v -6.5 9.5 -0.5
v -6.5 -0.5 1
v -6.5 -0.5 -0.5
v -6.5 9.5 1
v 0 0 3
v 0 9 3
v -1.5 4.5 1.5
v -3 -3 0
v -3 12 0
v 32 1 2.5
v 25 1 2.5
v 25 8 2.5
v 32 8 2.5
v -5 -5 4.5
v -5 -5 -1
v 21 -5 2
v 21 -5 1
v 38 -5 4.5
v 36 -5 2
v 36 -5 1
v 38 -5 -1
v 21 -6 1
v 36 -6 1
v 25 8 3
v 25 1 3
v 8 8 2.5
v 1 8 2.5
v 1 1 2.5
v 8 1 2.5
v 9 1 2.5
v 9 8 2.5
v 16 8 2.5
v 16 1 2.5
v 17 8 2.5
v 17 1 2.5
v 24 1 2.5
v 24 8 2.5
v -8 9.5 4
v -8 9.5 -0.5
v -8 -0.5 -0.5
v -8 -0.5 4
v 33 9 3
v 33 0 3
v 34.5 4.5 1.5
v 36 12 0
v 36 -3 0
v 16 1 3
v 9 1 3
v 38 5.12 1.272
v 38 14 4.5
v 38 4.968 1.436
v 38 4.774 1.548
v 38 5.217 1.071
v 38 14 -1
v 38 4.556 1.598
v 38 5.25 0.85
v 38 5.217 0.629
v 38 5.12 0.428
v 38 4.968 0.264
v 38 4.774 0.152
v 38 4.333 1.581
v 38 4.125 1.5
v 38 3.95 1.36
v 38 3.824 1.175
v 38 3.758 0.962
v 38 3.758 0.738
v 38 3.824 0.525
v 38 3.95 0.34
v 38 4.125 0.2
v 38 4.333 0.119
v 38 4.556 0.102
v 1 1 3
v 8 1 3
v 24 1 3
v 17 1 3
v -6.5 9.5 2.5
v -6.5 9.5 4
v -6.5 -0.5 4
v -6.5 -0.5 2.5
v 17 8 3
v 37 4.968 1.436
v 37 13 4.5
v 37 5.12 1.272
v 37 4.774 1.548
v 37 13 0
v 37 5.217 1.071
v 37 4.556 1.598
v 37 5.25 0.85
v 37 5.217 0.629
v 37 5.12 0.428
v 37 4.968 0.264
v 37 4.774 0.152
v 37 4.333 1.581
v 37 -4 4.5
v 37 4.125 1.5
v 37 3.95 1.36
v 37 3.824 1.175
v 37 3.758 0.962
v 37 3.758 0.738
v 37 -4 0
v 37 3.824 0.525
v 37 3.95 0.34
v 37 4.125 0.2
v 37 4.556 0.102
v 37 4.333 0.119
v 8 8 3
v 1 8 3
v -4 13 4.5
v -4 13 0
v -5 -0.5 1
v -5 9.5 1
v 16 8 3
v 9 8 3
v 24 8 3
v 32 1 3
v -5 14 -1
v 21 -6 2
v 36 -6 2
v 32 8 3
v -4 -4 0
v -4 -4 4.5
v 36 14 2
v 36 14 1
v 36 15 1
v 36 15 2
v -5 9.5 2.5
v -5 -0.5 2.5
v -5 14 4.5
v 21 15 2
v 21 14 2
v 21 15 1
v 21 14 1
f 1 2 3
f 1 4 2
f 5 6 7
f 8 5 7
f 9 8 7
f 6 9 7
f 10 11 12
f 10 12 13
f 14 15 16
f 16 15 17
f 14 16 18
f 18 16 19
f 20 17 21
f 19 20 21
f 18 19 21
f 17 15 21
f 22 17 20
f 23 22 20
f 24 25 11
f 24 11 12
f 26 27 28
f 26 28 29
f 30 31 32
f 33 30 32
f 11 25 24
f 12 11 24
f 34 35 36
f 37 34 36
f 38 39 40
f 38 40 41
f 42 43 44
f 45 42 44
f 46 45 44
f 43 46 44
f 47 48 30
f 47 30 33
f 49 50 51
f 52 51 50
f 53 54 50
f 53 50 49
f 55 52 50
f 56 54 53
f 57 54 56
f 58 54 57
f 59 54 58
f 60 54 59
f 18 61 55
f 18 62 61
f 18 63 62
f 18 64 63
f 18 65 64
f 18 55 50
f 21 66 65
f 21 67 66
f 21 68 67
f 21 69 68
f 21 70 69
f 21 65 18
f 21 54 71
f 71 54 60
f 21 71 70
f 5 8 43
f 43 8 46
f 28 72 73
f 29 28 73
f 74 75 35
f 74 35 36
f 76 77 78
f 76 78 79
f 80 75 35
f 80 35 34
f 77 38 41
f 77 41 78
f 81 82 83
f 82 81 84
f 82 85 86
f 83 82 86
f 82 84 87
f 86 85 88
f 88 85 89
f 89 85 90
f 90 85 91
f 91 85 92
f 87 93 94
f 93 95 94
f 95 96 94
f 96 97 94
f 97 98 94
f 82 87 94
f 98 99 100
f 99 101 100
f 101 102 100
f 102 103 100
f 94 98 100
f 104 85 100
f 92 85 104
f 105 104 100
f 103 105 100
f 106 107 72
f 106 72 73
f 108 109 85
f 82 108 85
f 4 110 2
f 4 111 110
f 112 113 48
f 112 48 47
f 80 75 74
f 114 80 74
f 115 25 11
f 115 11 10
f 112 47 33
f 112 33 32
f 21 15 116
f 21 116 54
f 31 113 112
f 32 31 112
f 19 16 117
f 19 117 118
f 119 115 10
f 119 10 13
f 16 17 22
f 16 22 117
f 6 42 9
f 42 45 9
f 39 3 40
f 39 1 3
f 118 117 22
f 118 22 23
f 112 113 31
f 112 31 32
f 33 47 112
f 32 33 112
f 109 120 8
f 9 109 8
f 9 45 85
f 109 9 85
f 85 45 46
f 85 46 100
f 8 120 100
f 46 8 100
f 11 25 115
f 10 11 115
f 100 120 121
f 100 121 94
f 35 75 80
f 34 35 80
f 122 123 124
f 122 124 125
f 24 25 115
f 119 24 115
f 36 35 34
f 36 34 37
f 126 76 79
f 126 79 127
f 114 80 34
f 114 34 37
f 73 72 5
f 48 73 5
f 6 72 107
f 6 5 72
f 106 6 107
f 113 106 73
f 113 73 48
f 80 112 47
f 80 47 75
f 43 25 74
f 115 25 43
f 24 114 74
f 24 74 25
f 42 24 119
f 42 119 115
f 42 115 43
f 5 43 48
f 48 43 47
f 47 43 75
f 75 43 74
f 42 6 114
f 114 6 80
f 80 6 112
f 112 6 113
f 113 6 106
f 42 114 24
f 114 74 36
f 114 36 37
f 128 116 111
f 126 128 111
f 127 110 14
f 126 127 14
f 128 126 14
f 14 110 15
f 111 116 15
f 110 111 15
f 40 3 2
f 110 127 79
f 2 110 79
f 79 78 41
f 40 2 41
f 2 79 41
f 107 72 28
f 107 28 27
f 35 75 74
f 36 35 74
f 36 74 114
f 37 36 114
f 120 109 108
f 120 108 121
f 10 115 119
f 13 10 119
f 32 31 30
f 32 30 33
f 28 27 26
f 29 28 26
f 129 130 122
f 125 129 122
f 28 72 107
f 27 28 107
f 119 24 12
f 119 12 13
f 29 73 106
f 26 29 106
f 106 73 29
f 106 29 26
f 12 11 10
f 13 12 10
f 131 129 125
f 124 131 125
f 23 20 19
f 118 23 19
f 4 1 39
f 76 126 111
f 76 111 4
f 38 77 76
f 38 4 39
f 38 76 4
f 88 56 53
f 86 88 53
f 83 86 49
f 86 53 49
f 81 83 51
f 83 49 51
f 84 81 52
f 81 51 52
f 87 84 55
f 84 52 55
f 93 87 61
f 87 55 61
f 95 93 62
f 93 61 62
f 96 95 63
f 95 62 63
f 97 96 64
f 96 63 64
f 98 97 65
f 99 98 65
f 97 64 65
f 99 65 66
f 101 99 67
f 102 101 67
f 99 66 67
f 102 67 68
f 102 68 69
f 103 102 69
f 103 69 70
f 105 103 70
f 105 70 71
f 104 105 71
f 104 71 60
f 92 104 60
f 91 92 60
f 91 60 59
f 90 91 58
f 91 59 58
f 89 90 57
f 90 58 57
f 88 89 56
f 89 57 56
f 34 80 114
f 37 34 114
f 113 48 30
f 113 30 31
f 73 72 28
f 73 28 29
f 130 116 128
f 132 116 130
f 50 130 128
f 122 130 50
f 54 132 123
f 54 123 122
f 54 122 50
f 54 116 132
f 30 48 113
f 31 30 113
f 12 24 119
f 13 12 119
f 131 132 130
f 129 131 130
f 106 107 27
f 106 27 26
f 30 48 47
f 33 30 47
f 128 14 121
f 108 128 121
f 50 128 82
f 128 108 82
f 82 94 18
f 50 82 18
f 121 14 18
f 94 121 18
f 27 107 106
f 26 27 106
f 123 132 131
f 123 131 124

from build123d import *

# Parameters (mm, degrees)
F2_W      = 33
F2_H      = 9
F0_W      = 39
F0_H      = 15
F4_W      = 7
F4_H      = 7
F5_DEPTH  = 0.5
F6_DEPTH  = 0.5
F7_W      = 43
F7_H      = 19
F7_W_2    = 41
F7_H_2    = 17
F7_W_3    = 39
F7_H_3    = 15
F8_DEPTH  = 1
F9_DEPTH  = 4.5
F10_R     = 0.75
F11_DEPTH = 1
F12_W     = 15
F12_H     = 1
F13_DEPTH = 1
F18_DEPTH = 5


# Not quite as in the source:
# - a feature of the source that left no trace in its solid (it failed there, or was rolled back) is left out
# - a pattern or mirror of a feature is missing from the dataset's text; its kind, count and spacing are read off the source's solid


with BuildPart() as f3:
    # F2 (on offset) → F3 section 0
    with BuildSketch(Plane.XY.offset(3)):
        with Locations((16.5, 4.5)):
            Rectangle(F2_W, F2_H)
    # F0 (on Top) → F3 section 1
    with BuildSketch(Plane.XY):
        with Locations((16.5, 4.5)):
            Rectangle(F0_W, F0_H)
    loft()

    # F4 (on offset) → F5 (cut)
    with BuildSketch(Plane.XY.offset(3)):
        with Locations((28.5, 4.5)):
            Rectangle(F4_W, F4_H)
        with Locations((20.5, 4.5)):
            Rectangle(F4_W, F4_H)
        with Locations((12.5, 4.5)):
            Rectangle(F4_W, F4_H)
        with Locations((4.5, 4.5)):
            Rectangle(F4_W, F4_H)
    extrude(amount=-F5_DEPTH, mode=Mode.SUBTRACT)

    # F7 (on face) → F8 (join)
    with BuildSketch(Plane(origin=(0, 0, 0), x_dir=(1, 0, 0), z_dir=(0, 0, -1))):
        with Locations((16.5, -4.5)):
            Rectangle(F7_W, F7_H)
        with Locations((16.5, -4.5)):
            Rectangle(F7_W_2, F7_H_2, mode=Mode.SUBTRACT)
        with Locations((16.5, -4.5)):
            Rectangle(F7_W_2, F7_H_2)
        with Locations((16.5, -4.5)):
            Rectangle(F7_W_3, F7_H_3, mode=Mode.SUBTRACT)
        with Locations((16.5, -4.5)):
            Rectangle(F7_W_3, F7_H_3)
    extrude(amount=F8_DEPTH)

    # F7 (on face) → F9 (join)
    with BuildSketch(Plane(origin=(0, 0, 0), x_dir=(1, 0, 0), z_dir=(0, 0, -1))):
        with Locations((16.5, -4.5)):
            Rectangle(F7_W, F7_H)
        with Locations((16.5, -4.5)):
            Rectangle(F7_W_2, F7_H_2, mode=Mode.SUBTRACT)
    extrude(amount=-F9_DEPTH)

    # F10 (on face) → F11 (cut, through all)
    with BuildSketch(Plane.YZ.offset(38)):
        with Locations((4.5, 0.85)):
            Circle(F10_R)
    extrude(amount=-F11_DEPTH, mode=Mode.SUBTRACT)

    # F12 (on face) → F13 (join)
    with BuildSketch(Plane.XZ.offset(5)):
        with Locations((28.5, 1.5)):
            Rectangle(F12_W, F12_H)
    f13 = extrude(amount=F13_DEPTH)

    # F13_copies: F13 across plane
    add(f13.mirror(Plane.ZX.offset(4.5)))

    # F17 (on face) → F18 (join, symmetric)
    with BuildSketch(Plane(origin=(0, 4.5, 0), x_dir=(-1, 0, 0), z_dir=(0, 1, 0))):
        Polygon((6.5, 1.75), (6.5, 1), (6.5, -0.5), (8, -0.5), (8, 4), (6.5, 4), (6.5, 2.5), align=None)
        Polygon((5, 2.5), (5, 1), (6.5, 1), (6.5, 1.75), (6.5, 2.5), align=None)
    extrude(amount=F18_DEPTH, both=True)


with BuildPart() as f6:
    # F4 (on offset) → F6 (new body)
    with BuildSketch(Plane.XY.offset(3)):
        with Locations((4.5, 4.5)):
            Rectangle(F4_W, F4_H)
    extrude(amount=-F6_DEPTH)


with BuildPart() as f6b:
    # F4 (on offset) → F6, piece 2 (new body)
    with BuildSketch(Plane.XY.offset(3)):
        with Locations((12.5, 4.5)):
            Rectangle(F4_W, F4_H)
    extrude(amount=-F6_DEPTH)


with BuildPart() as f6c:
    # F4 (on offset) → F6, piece 3 (new body)
    with BuildSketch(Plane.XY.offset(3)):
        with Locations((20.5, 4.5)):
            Rectangle(F4_W, F4_H)
    extrude(amount=-F6_DEPTH)


with BuildPart() as f6d:
    # F4 (on offset) → F6, piece 4 (new body)
    with BuildSketch(Plane.XY.offset(3)):
        with Locations((28.5, 4.5)):
            Rectangle(F4_W, F4_H)
    extrude(amount=-F6_DEPTH)


solid = Compound([f3.part, f6.part, f6b.part, f6c.part, f6d.part])
